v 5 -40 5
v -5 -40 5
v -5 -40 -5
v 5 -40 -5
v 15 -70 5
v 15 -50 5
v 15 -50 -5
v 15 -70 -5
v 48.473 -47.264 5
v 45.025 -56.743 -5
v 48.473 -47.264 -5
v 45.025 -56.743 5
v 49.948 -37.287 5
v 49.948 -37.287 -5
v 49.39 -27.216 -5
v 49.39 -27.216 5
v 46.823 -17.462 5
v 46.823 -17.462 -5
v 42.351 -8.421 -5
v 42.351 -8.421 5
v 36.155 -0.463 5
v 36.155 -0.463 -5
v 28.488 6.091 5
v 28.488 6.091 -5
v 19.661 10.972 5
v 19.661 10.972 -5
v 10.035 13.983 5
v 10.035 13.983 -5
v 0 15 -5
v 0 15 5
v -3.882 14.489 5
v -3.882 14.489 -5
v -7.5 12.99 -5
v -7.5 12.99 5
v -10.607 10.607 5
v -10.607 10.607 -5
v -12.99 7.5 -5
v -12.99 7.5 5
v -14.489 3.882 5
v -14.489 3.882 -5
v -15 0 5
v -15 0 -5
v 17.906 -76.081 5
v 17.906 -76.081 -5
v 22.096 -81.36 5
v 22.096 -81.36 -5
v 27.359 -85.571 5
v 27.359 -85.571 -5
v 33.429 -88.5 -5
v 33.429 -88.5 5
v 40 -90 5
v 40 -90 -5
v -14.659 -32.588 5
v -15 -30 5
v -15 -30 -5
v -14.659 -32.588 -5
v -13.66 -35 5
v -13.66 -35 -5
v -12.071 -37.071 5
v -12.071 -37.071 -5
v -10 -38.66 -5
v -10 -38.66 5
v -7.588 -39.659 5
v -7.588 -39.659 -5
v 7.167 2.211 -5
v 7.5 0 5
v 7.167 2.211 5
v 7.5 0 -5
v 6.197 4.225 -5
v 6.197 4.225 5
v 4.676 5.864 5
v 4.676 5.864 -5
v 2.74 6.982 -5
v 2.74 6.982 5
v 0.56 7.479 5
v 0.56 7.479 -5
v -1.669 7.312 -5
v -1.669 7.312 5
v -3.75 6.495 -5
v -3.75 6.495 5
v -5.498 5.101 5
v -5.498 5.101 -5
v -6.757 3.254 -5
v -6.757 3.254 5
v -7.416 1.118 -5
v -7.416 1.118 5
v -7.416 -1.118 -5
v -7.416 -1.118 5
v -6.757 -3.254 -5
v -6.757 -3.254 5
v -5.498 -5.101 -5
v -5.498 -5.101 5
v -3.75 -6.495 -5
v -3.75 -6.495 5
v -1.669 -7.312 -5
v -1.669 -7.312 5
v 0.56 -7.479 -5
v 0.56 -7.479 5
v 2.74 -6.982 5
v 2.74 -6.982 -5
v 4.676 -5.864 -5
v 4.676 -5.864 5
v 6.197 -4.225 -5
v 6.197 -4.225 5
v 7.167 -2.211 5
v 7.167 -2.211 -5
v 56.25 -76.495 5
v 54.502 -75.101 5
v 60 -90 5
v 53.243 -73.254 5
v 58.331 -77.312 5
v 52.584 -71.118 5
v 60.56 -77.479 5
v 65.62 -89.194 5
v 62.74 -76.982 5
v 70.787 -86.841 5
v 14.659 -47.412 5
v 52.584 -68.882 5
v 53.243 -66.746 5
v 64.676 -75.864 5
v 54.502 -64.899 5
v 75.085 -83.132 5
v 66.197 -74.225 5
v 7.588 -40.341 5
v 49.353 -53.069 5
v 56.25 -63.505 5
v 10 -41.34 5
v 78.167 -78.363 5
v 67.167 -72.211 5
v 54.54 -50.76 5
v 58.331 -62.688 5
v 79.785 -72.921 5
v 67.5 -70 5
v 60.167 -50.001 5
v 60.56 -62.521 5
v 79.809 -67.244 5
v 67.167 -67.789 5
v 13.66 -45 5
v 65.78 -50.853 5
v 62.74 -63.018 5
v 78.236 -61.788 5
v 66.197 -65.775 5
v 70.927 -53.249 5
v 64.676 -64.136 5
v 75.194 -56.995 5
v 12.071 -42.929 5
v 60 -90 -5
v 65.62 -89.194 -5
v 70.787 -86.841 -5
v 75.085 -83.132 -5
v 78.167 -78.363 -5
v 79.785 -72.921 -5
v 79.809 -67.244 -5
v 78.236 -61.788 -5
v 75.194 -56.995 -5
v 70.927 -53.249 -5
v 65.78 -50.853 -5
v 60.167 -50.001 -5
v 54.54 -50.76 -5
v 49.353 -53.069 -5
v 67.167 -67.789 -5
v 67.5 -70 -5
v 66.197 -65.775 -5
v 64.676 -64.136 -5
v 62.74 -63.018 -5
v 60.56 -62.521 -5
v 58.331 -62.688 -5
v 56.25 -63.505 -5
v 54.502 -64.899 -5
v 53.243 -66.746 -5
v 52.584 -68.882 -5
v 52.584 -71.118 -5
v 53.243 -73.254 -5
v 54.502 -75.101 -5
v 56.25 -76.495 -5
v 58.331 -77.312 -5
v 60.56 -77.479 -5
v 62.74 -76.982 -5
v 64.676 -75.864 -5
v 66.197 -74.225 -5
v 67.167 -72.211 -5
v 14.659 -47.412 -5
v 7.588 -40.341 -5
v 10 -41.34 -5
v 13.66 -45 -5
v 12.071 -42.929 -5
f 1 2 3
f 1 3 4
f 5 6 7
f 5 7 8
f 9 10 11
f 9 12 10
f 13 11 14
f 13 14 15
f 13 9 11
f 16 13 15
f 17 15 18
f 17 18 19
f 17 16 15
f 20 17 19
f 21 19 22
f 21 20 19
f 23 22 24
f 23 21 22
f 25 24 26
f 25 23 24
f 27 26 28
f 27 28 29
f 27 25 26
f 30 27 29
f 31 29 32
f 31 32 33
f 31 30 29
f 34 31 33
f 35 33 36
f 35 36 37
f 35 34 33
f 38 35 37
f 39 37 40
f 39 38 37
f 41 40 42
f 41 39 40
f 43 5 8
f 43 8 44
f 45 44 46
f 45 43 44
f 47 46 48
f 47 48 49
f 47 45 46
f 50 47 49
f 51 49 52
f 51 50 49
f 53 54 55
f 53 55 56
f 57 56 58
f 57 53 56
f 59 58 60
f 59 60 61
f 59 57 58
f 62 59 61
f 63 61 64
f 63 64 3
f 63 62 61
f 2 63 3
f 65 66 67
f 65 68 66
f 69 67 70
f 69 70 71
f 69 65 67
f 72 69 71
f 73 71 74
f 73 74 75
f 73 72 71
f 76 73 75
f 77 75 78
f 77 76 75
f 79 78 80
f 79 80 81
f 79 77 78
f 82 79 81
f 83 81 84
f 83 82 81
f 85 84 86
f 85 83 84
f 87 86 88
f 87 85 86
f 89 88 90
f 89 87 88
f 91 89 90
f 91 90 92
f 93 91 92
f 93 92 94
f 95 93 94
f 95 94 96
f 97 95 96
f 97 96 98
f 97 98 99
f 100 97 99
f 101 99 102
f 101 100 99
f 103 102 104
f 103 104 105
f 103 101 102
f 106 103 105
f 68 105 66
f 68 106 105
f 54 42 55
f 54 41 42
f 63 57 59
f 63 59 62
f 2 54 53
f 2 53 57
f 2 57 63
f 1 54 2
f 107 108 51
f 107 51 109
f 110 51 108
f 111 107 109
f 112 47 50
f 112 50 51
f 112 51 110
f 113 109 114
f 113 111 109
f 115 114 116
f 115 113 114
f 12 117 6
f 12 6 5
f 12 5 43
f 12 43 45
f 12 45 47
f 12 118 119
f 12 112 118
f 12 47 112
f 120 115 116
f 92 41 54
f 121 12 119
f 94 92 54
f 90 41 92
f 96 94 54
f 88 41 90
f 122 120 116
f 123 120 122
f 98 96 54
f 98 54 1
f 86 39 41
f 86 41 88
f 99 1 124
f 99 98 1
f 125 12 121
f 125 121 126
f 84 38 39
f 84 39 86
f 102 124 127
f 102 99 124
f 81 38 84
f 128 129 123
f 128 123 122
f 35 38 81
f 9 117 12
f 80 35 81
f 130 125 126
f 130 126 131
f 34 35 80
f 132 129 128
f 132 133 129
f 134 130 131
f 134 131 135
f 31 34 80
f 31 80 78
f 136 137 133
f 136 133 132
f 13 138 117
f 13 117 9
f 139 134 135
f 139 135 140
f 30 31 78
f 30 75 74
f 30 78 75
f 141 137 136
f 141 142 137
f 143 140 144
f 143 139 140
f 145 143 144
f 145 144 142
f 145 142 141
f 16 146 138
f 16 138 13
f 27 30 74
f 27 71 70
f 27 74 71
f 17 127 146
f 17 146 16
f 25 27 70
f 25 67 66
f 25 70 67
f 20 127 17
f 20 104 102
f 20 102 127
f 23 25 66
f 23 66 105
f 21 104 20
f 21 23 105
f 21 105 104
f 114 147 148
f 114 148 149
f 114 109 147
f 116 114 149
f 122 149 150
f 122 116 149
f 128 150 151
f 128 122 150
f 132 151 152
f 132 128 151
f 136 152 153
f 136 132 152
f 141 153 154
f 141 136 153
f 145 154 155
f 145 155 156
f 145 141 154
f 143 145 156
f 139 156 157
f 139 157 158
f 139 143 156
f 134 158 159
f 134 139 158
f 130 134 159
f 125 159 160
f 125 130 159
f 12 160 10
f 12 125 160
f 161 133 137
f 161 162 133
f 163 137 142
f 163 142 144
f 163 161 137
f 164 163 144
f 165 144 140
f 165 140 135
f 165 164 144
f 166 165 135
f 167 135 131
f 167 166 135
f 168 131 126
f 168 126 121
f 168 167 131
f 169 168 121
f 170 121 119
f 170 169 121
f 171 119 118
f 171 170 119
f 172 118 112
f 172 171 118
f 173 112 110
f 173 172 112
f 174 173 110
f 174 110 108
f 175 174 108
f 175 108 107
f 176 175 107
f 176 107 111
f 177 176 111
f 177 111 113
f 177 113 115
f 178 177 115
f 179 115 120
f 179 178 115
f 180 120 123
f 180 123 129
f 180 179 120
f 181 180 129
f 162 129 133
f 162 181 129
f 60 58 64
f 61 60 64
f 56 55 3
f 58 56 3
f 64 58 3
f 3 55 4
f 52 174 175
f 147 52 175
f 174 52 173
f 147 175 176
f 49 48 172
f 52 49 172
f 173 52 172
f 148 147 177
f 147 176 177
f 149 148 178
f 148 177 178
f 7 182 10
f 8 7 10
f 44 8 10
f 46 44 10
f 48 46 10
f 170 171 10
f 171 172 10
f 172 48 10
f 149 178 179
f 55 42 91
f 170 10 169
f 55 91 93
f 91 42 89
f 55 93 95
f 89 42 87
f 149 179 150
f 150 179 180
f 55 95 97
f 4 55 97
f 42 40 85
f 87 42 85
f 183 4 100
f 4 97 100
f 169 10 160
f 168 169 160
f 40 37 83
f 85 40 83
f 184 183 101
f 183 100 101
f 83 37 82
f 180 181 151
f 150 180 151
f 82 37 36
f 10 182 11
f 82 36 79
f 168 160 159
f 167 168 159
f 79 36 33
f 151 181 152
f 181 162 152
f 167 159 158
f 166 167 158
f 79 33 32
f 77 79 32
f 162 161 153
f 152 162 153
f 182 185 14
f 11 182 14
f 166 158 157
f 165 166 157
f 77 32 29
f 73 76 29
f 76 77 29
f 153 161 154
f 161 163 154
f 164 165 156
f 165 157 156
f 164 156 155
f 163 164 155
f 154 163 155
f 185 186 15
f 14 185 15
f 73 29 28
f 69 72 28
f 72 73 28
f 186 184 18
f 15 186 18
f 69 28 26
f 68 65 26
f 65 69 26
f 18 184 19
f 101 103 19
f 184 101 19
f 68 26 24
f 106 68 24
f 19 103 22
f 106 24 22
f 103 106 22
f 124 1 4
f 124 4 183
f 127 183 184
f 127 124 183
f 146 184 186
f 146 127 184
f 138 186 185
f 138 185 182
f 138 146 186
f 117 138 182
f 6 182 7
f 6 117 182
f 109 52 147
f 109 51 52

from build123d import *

# Parameters (mm, degrees)
SKETCH1_R           = 7.5
BOSS_EXTRUDE1_DEPTH = 5


with BuildPart() as part:
    # Sketch1 → Boss-Extrude1 (new, symmetric)
    with BuildSketch(Plane.XY):
        with BuildLine():
            Line((-15, 0), (-15, -30))
            ThreePointArc((-15, -30), (-12.071067812, -37.071067812), (-5, -40))
            Line((-5, -40), (5, -40))
            ThreePointArc((5, -40), (12.071067812, -42.928932188), (15, -50))
            Line((15, -50), (15, -70))
            ThreePointArc((15, -70), (24.609054321, -83.613682099), (40, -90))
            Line((40, -90), (60, -90))
            ThreePointArc((60, -90), (78.236466389, -61.788344037), (45.024841203, -56.743129366))
            ThreePointArc((45.024841203, -56.743129366), (42.350658013, -8.42140399), (0, 15))
            ThreePointArc((0, 15), (-10.606601718, 10.606601718), (-15, 0))
        make_face()
        Circle(SKETCH1_R, mode=Mode.SUBTRACT)
        with Locations((60, -70)):
            Circle(SKETCH1_R, mode=Mode.SUBTRACT)
    extrude(amount=BOSS_EXTRUDE1_DEPTH, both=True)


solid = part.part
